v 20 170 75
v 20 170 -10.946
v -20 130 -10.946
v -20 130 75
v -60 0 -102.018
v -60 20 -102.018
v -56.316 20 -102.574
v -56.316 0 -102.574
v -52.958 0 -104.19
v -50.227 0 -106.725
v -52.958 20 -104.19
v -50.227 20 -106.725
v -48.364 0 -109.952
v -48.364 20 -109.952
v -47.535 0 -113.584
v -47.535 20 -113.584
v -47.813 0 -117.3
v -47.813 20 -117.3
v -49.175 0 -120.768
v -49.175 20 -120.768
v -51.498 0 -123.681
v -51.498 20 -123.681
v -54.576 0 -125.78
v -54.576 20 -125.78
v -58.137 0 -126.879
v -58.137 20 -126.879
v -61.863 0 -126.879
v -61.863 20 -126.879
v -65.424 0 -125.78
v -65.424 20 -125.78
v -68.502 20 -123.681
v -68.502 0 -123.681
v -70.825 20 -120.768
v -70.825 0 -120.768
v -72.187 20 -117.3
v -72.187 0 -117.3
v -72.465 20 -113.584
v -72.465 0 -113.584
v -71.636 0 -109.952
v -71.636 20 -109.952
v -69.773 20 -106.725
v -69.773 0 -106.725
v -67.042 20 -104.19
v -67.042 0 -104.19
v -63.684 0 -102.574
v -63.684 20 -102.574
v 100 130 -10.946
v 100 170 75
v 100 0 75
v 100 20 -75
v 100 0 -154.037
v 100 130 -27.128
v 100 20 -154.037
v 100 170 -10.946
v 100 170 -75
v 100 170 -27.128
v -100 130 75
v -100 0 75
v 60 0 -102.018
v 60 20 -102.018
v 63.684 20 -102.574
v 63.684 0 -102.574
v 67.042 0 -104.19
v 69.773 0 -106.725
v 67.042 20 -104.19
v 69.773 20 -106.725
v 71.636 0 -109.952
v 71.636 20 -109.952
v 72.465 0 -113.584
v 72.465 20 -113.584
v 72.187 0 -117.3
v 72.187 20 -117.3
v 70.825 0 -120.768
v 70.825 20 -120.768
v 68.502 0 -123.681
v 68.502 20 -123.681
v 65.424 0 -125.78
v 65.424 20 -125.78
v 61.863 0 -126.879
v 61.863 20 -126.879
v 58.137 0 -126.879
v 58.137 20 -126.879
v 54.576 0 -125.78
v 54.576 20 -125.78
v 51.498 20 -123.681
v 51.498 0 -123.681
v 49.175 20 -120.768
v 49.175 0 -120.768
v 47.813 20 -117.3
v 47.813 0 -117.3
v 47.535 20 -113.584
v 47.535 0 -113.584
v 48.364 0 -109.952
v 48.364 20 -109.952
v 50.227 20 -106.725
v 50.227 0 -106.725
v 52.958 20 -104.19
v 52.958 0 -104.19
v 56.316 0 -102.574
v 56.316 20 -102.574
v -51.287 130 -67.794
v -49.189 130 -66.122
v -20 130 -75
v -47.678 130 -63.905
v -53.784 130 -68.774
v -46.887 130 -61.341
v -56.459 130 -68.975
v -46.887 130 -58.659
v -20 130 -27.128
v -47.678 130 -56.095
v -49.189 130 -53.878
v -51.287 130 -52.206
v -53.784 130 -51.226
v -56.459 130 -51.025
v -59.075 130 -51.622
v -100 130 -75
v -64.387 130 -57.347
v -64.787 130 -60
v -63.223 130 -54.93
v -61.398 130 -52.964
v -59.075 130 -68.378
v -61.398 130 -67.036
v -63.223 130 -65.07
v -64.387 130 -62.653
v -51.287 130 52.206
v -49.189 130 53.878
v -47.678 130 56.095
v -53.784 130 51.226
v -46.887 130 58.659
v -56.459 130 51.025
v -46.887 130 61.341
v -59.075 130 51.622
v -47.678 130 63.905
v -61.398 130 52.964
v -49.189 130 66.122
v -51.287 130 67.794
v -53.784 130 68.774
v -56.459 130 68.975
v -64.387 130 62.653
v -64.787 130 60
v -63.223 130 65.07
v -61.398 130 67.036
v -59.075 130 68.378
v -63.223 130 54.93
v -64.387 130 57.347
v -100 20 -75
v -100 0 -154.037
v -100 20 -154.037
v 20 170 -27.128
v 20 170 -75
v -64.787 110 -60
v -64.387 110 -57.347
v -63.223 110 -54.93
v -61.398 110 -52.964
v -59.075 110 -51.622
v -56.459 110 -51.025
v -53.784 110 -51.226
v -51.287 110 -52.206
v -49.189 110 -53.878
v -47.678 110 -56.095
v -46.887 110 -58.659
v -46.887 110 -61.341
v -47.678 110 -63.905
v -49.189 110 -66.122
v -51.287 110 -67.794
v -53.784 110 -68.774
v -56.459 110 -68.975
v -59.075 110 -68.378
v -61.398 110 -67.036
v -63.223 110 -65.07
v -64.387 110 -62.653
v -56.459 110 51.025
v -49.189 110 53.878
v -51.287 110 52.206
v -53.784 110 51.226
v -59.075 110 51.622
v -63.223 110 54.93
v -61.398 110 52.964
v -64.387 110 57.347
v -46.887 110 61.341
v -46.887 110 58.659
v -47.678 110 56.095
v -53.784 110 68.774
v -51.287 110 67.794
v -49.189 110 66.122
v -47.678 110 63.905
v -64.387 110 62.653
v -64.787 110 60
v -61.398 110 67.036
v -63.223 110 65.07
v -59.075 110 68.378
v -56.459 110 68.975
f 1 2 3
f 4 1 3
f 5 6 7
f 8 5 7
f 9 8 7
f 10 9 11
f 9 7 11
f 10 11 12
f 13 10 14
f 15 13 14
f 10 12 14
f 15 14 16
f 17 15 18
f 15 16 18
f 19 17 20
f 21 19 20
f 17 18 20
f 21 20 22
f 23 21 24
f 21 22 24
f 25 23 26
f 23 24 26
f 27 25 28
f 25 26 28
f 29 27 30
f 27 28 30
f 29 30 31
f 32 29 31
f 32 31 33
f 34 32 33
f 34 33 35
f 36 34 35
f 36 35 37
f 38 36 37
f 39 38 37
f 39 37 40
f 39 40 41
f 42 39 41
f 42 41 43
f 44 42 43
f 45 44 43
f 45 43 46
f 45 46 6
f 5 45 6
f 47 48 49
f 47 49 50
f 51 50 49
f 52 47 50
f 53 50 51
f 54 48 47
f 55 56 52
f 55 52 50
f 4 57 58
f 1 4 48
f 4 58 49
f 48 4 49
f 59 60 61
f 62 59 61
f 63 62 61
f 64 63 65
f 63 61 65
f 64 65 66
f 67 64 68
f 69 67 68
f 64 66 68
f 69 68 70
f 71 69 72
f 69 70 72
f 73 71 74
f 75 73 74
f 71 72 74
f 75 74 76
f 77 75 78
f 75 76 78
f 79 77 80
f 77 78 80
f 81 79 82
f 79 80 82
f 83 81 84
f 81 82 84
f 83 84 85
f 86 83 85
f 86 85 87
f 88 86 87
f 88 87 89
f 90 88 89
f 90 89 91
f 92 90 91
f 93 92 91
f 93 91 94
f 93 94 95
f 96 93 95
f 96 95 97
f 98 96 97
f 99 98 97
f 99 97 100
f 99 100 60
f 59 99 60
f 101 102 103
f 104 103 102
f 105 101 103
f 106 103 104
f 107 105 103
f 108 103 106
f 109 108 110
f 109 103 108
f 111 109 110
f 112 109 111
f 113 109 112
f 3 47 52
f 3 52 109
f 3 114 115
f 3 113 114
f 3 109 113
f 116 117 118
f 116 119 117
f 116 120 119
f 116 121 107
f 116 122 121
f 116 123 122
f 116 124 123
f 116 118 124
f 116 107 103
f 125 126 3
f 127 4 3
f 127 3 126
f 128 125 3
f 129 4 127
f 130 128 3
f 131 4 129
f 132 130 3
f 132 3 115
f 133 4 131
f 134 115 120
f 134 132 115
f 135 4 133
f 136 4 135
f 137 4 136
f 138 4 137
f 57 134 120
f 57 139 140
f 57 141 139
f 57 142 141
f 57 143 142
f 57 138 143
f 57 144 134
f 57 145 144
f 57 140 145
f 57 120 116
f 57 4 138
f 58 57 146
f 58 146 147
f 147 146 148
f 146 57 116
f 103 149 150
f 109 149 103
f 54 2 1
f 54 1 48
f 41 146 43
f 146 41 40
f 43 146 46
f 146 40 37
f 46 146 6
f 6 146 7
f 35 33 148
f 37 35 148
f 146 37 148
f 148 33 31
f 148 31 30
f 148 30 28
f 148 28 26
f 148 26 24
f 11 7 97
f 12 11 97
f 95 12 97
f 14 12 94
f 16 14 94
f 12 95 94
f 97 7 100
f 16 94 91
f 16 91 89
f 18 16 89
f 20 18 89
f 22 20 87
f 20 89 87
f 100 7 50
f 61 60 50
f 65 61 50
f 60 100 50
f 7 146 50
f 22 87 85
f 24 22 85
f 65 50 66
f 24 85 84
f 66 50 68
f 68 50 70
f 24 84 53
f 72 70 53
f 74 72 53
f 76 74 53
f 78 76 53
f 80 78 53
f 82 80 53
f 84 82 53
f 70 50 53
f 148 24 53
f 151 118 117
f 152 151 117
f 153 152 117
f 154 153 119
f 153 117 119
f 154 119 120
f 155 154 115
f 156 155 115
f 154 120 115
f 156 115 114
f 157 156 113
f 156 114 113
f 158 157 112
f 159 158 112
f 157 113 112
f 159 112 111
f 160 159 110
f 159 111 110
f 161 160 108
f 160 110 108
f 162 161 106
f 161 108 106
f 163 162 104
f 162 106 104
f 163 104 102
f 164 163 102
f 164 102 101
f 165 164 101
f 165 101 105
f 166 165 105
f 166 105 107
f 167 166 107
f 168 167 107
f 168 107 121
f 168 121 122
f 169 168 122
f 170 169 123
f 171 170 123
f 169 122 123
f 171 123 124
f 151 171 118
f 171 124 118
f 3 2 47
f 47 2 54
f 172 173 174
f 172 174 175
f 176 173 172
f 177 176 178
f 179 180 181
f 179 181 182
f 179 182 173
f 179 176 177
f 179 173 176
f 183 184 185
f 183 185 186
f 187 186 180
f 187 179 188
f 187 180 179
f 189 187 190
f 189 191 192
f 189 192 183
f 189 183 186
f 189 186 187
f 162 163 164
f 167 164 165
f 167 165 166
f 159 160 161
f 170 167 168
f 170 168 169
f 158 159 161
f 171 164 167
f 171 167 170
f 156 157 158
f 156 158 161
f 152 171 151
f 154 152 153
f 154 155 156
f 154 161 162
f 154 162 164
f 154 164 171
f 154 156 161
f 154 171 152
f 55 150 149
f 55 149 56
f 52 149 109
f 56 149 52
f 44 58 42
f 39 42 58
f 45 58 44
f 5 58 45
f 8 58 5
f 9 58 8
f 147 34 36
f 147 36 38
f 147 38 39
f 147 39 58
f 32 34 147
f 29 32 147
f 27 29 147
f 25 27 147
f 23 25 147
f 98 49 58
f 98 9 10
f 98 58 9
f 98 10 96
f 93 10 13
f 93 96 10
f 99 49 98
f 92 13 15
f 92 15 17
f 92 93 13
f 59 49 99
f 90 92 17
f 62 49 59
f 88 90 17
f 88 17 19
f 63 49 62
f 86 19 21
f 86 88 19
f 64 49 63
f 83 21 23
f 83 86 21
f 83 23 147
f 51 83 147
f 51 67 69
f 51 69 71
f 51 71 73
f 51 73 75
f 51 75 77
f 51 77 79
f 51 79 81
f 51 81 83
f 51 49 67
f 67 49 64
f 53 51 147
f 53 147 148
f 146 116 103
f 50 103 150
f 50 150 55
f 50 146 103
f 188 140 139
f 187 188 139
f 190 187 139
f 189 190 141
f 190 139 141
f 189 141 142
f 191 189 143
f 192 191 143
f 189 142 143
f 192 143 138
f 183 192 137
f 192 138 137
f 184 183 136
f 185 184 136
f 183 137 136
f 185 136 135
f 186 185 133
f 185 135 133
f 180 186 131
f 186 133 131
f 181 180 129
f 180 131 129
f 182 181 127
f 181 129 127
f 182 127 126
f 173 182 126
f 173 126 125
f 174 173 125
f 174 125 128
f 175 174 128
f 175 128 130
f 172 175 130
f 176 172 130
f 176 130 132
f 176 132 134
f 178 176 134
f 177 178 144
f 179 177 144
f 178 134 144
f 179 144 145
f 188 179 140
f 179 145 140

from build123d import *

# Parameters (mm, degrees)
SKETCH_1_W               = 200
SKETCH_1_H               = 150
EXTRUDE_1_DEPTH          = 180
CUT_EXTRUDE_1_DEPTH      = 100
SKETCH_3_W               = 120
SKETCH_3_H               = 16.18209701
CUT_EXTRUDE_2_DEPTH      = 50
SKETCH_4_R               = 9
CUT_EXTRUDE_3_DEPTH      = 20
SKETCH_5_W               = 79.036616744
SKETCH_5_H               = 20
EXTRUDE_2_DEPTH          = 200
SKETCH_6_R               = 12.5
CUT_EXTRUDE_4_DEPTH      = 210
CUT_EXTRUDE_5_DEPTH      = 308.989889135
CUT_EXTRUDE_5_DEPTH_BACK = 308.989889135


with BuildPart() as part:
    # 草图1 → 凸台-拉伸1 (new body)
    with BuildSketch(Plane(origin=(0, 0, 0), x_dir=(1, 0, 0), z_dir=(0, 1, 0))):
        Rectangle(SKETCH_1_W, SKETCH_1_H)
    extrude(amount=EXTRUDE_1_DEPTH)

    # 草图2 → 切除-拉伸1 (cut, symmetric)
    with BuildSketch(Plane.XY):
        Polygon((-100, 180), (30, 180), (-20, 130), (-100, 130), align=None)
    extrude(amount=CUT_EXTRUDE_1_DEPTH, both=True, mode=Mode.SUBTRACT)

    # 草图3 → 切除-拉伸2 (cut)
    with BuildSketch(Plane(origin=(0, 180, 0), x_dir=(1, 0, 0), z_dir=(0, 1, 0))):
        with Locations((40, 19.036616744)):
            Rectangle(SKETCH_3_W, SKETCH_3_H)
    extrude(amount=-CUT_EXTRUDE_2_DEPTH, mode=Mode.SUBTRACT)

    # 草图4 → 切除-拉伸3 (cut)
    with BuildSketch(Plane(origin=(0, 130, 0), x_dir=(1, 0, 0), z_dir=(0, 1, 0))):
        with Locations(Location((-55.786910577, 60, 0), (0, 0, 180))):
            Circle(SKETCH_4_R)
        with Locations(Location((-55.786910577, -60, 0), (0, 0, 180))):
            Circle(SKETCH_4_R)
    extrude(amount=-CUT_EXTRUDE_3_DEPTH, mode=Mode.SUBTRACT)

    # 草图5 → 凸台-拉伸2 (add)
    with BuildSketch(Plane(origin=(100, 0, 0), x_dir=(0, 0, -1), z_dir=(1, 0, 0))):
        with Locations((114.518308372, 10)):
            Rectangle(SKETCH_5_W, SKETCH_5_H)
    extrude(amount=-EXTRUDE_2_DEPTH)

    # 草图6 → 切除-拉伸4 (cut)
    with BuildSketch(Plane(origin=(0, 20, 0), x_dir=(1, 0, 0), z_dir=(0, 1, 0))):
        with Locations(Location((-60, 114.518308372, 0), (0, 0, 270))):
            Circle(SKETCH_6_R)
        with Locations(Location((60, 114.518308372, 0), (0, 0, 270))):
            Circle(SKETCH_6_R)
    extrude(amount=-CUT_EXTRUDE_4_DEPTH, mode=Mode.SUBTRACT)

    # 草图7 → 切除-拉伸5 (cut, two sides: drawn at the far end of the back side and taken through both)
    with BuildSketch(Plane.XY.offset(75).offset(-CUT_EXTRUDE_5_DEPTH_BACK)):
        Polygon((20, 170), (112.388945941, 170), (112.388945941, 195.821739968), (6.51381217, 195.821739968), align=None)
    extrude(amount=CUT_EXTRUDE_5_DEPTH + CUT_EXTRUDE_5_DEPTH_BACK, mode=Mode.SUBTRACT)


solid = part.part
